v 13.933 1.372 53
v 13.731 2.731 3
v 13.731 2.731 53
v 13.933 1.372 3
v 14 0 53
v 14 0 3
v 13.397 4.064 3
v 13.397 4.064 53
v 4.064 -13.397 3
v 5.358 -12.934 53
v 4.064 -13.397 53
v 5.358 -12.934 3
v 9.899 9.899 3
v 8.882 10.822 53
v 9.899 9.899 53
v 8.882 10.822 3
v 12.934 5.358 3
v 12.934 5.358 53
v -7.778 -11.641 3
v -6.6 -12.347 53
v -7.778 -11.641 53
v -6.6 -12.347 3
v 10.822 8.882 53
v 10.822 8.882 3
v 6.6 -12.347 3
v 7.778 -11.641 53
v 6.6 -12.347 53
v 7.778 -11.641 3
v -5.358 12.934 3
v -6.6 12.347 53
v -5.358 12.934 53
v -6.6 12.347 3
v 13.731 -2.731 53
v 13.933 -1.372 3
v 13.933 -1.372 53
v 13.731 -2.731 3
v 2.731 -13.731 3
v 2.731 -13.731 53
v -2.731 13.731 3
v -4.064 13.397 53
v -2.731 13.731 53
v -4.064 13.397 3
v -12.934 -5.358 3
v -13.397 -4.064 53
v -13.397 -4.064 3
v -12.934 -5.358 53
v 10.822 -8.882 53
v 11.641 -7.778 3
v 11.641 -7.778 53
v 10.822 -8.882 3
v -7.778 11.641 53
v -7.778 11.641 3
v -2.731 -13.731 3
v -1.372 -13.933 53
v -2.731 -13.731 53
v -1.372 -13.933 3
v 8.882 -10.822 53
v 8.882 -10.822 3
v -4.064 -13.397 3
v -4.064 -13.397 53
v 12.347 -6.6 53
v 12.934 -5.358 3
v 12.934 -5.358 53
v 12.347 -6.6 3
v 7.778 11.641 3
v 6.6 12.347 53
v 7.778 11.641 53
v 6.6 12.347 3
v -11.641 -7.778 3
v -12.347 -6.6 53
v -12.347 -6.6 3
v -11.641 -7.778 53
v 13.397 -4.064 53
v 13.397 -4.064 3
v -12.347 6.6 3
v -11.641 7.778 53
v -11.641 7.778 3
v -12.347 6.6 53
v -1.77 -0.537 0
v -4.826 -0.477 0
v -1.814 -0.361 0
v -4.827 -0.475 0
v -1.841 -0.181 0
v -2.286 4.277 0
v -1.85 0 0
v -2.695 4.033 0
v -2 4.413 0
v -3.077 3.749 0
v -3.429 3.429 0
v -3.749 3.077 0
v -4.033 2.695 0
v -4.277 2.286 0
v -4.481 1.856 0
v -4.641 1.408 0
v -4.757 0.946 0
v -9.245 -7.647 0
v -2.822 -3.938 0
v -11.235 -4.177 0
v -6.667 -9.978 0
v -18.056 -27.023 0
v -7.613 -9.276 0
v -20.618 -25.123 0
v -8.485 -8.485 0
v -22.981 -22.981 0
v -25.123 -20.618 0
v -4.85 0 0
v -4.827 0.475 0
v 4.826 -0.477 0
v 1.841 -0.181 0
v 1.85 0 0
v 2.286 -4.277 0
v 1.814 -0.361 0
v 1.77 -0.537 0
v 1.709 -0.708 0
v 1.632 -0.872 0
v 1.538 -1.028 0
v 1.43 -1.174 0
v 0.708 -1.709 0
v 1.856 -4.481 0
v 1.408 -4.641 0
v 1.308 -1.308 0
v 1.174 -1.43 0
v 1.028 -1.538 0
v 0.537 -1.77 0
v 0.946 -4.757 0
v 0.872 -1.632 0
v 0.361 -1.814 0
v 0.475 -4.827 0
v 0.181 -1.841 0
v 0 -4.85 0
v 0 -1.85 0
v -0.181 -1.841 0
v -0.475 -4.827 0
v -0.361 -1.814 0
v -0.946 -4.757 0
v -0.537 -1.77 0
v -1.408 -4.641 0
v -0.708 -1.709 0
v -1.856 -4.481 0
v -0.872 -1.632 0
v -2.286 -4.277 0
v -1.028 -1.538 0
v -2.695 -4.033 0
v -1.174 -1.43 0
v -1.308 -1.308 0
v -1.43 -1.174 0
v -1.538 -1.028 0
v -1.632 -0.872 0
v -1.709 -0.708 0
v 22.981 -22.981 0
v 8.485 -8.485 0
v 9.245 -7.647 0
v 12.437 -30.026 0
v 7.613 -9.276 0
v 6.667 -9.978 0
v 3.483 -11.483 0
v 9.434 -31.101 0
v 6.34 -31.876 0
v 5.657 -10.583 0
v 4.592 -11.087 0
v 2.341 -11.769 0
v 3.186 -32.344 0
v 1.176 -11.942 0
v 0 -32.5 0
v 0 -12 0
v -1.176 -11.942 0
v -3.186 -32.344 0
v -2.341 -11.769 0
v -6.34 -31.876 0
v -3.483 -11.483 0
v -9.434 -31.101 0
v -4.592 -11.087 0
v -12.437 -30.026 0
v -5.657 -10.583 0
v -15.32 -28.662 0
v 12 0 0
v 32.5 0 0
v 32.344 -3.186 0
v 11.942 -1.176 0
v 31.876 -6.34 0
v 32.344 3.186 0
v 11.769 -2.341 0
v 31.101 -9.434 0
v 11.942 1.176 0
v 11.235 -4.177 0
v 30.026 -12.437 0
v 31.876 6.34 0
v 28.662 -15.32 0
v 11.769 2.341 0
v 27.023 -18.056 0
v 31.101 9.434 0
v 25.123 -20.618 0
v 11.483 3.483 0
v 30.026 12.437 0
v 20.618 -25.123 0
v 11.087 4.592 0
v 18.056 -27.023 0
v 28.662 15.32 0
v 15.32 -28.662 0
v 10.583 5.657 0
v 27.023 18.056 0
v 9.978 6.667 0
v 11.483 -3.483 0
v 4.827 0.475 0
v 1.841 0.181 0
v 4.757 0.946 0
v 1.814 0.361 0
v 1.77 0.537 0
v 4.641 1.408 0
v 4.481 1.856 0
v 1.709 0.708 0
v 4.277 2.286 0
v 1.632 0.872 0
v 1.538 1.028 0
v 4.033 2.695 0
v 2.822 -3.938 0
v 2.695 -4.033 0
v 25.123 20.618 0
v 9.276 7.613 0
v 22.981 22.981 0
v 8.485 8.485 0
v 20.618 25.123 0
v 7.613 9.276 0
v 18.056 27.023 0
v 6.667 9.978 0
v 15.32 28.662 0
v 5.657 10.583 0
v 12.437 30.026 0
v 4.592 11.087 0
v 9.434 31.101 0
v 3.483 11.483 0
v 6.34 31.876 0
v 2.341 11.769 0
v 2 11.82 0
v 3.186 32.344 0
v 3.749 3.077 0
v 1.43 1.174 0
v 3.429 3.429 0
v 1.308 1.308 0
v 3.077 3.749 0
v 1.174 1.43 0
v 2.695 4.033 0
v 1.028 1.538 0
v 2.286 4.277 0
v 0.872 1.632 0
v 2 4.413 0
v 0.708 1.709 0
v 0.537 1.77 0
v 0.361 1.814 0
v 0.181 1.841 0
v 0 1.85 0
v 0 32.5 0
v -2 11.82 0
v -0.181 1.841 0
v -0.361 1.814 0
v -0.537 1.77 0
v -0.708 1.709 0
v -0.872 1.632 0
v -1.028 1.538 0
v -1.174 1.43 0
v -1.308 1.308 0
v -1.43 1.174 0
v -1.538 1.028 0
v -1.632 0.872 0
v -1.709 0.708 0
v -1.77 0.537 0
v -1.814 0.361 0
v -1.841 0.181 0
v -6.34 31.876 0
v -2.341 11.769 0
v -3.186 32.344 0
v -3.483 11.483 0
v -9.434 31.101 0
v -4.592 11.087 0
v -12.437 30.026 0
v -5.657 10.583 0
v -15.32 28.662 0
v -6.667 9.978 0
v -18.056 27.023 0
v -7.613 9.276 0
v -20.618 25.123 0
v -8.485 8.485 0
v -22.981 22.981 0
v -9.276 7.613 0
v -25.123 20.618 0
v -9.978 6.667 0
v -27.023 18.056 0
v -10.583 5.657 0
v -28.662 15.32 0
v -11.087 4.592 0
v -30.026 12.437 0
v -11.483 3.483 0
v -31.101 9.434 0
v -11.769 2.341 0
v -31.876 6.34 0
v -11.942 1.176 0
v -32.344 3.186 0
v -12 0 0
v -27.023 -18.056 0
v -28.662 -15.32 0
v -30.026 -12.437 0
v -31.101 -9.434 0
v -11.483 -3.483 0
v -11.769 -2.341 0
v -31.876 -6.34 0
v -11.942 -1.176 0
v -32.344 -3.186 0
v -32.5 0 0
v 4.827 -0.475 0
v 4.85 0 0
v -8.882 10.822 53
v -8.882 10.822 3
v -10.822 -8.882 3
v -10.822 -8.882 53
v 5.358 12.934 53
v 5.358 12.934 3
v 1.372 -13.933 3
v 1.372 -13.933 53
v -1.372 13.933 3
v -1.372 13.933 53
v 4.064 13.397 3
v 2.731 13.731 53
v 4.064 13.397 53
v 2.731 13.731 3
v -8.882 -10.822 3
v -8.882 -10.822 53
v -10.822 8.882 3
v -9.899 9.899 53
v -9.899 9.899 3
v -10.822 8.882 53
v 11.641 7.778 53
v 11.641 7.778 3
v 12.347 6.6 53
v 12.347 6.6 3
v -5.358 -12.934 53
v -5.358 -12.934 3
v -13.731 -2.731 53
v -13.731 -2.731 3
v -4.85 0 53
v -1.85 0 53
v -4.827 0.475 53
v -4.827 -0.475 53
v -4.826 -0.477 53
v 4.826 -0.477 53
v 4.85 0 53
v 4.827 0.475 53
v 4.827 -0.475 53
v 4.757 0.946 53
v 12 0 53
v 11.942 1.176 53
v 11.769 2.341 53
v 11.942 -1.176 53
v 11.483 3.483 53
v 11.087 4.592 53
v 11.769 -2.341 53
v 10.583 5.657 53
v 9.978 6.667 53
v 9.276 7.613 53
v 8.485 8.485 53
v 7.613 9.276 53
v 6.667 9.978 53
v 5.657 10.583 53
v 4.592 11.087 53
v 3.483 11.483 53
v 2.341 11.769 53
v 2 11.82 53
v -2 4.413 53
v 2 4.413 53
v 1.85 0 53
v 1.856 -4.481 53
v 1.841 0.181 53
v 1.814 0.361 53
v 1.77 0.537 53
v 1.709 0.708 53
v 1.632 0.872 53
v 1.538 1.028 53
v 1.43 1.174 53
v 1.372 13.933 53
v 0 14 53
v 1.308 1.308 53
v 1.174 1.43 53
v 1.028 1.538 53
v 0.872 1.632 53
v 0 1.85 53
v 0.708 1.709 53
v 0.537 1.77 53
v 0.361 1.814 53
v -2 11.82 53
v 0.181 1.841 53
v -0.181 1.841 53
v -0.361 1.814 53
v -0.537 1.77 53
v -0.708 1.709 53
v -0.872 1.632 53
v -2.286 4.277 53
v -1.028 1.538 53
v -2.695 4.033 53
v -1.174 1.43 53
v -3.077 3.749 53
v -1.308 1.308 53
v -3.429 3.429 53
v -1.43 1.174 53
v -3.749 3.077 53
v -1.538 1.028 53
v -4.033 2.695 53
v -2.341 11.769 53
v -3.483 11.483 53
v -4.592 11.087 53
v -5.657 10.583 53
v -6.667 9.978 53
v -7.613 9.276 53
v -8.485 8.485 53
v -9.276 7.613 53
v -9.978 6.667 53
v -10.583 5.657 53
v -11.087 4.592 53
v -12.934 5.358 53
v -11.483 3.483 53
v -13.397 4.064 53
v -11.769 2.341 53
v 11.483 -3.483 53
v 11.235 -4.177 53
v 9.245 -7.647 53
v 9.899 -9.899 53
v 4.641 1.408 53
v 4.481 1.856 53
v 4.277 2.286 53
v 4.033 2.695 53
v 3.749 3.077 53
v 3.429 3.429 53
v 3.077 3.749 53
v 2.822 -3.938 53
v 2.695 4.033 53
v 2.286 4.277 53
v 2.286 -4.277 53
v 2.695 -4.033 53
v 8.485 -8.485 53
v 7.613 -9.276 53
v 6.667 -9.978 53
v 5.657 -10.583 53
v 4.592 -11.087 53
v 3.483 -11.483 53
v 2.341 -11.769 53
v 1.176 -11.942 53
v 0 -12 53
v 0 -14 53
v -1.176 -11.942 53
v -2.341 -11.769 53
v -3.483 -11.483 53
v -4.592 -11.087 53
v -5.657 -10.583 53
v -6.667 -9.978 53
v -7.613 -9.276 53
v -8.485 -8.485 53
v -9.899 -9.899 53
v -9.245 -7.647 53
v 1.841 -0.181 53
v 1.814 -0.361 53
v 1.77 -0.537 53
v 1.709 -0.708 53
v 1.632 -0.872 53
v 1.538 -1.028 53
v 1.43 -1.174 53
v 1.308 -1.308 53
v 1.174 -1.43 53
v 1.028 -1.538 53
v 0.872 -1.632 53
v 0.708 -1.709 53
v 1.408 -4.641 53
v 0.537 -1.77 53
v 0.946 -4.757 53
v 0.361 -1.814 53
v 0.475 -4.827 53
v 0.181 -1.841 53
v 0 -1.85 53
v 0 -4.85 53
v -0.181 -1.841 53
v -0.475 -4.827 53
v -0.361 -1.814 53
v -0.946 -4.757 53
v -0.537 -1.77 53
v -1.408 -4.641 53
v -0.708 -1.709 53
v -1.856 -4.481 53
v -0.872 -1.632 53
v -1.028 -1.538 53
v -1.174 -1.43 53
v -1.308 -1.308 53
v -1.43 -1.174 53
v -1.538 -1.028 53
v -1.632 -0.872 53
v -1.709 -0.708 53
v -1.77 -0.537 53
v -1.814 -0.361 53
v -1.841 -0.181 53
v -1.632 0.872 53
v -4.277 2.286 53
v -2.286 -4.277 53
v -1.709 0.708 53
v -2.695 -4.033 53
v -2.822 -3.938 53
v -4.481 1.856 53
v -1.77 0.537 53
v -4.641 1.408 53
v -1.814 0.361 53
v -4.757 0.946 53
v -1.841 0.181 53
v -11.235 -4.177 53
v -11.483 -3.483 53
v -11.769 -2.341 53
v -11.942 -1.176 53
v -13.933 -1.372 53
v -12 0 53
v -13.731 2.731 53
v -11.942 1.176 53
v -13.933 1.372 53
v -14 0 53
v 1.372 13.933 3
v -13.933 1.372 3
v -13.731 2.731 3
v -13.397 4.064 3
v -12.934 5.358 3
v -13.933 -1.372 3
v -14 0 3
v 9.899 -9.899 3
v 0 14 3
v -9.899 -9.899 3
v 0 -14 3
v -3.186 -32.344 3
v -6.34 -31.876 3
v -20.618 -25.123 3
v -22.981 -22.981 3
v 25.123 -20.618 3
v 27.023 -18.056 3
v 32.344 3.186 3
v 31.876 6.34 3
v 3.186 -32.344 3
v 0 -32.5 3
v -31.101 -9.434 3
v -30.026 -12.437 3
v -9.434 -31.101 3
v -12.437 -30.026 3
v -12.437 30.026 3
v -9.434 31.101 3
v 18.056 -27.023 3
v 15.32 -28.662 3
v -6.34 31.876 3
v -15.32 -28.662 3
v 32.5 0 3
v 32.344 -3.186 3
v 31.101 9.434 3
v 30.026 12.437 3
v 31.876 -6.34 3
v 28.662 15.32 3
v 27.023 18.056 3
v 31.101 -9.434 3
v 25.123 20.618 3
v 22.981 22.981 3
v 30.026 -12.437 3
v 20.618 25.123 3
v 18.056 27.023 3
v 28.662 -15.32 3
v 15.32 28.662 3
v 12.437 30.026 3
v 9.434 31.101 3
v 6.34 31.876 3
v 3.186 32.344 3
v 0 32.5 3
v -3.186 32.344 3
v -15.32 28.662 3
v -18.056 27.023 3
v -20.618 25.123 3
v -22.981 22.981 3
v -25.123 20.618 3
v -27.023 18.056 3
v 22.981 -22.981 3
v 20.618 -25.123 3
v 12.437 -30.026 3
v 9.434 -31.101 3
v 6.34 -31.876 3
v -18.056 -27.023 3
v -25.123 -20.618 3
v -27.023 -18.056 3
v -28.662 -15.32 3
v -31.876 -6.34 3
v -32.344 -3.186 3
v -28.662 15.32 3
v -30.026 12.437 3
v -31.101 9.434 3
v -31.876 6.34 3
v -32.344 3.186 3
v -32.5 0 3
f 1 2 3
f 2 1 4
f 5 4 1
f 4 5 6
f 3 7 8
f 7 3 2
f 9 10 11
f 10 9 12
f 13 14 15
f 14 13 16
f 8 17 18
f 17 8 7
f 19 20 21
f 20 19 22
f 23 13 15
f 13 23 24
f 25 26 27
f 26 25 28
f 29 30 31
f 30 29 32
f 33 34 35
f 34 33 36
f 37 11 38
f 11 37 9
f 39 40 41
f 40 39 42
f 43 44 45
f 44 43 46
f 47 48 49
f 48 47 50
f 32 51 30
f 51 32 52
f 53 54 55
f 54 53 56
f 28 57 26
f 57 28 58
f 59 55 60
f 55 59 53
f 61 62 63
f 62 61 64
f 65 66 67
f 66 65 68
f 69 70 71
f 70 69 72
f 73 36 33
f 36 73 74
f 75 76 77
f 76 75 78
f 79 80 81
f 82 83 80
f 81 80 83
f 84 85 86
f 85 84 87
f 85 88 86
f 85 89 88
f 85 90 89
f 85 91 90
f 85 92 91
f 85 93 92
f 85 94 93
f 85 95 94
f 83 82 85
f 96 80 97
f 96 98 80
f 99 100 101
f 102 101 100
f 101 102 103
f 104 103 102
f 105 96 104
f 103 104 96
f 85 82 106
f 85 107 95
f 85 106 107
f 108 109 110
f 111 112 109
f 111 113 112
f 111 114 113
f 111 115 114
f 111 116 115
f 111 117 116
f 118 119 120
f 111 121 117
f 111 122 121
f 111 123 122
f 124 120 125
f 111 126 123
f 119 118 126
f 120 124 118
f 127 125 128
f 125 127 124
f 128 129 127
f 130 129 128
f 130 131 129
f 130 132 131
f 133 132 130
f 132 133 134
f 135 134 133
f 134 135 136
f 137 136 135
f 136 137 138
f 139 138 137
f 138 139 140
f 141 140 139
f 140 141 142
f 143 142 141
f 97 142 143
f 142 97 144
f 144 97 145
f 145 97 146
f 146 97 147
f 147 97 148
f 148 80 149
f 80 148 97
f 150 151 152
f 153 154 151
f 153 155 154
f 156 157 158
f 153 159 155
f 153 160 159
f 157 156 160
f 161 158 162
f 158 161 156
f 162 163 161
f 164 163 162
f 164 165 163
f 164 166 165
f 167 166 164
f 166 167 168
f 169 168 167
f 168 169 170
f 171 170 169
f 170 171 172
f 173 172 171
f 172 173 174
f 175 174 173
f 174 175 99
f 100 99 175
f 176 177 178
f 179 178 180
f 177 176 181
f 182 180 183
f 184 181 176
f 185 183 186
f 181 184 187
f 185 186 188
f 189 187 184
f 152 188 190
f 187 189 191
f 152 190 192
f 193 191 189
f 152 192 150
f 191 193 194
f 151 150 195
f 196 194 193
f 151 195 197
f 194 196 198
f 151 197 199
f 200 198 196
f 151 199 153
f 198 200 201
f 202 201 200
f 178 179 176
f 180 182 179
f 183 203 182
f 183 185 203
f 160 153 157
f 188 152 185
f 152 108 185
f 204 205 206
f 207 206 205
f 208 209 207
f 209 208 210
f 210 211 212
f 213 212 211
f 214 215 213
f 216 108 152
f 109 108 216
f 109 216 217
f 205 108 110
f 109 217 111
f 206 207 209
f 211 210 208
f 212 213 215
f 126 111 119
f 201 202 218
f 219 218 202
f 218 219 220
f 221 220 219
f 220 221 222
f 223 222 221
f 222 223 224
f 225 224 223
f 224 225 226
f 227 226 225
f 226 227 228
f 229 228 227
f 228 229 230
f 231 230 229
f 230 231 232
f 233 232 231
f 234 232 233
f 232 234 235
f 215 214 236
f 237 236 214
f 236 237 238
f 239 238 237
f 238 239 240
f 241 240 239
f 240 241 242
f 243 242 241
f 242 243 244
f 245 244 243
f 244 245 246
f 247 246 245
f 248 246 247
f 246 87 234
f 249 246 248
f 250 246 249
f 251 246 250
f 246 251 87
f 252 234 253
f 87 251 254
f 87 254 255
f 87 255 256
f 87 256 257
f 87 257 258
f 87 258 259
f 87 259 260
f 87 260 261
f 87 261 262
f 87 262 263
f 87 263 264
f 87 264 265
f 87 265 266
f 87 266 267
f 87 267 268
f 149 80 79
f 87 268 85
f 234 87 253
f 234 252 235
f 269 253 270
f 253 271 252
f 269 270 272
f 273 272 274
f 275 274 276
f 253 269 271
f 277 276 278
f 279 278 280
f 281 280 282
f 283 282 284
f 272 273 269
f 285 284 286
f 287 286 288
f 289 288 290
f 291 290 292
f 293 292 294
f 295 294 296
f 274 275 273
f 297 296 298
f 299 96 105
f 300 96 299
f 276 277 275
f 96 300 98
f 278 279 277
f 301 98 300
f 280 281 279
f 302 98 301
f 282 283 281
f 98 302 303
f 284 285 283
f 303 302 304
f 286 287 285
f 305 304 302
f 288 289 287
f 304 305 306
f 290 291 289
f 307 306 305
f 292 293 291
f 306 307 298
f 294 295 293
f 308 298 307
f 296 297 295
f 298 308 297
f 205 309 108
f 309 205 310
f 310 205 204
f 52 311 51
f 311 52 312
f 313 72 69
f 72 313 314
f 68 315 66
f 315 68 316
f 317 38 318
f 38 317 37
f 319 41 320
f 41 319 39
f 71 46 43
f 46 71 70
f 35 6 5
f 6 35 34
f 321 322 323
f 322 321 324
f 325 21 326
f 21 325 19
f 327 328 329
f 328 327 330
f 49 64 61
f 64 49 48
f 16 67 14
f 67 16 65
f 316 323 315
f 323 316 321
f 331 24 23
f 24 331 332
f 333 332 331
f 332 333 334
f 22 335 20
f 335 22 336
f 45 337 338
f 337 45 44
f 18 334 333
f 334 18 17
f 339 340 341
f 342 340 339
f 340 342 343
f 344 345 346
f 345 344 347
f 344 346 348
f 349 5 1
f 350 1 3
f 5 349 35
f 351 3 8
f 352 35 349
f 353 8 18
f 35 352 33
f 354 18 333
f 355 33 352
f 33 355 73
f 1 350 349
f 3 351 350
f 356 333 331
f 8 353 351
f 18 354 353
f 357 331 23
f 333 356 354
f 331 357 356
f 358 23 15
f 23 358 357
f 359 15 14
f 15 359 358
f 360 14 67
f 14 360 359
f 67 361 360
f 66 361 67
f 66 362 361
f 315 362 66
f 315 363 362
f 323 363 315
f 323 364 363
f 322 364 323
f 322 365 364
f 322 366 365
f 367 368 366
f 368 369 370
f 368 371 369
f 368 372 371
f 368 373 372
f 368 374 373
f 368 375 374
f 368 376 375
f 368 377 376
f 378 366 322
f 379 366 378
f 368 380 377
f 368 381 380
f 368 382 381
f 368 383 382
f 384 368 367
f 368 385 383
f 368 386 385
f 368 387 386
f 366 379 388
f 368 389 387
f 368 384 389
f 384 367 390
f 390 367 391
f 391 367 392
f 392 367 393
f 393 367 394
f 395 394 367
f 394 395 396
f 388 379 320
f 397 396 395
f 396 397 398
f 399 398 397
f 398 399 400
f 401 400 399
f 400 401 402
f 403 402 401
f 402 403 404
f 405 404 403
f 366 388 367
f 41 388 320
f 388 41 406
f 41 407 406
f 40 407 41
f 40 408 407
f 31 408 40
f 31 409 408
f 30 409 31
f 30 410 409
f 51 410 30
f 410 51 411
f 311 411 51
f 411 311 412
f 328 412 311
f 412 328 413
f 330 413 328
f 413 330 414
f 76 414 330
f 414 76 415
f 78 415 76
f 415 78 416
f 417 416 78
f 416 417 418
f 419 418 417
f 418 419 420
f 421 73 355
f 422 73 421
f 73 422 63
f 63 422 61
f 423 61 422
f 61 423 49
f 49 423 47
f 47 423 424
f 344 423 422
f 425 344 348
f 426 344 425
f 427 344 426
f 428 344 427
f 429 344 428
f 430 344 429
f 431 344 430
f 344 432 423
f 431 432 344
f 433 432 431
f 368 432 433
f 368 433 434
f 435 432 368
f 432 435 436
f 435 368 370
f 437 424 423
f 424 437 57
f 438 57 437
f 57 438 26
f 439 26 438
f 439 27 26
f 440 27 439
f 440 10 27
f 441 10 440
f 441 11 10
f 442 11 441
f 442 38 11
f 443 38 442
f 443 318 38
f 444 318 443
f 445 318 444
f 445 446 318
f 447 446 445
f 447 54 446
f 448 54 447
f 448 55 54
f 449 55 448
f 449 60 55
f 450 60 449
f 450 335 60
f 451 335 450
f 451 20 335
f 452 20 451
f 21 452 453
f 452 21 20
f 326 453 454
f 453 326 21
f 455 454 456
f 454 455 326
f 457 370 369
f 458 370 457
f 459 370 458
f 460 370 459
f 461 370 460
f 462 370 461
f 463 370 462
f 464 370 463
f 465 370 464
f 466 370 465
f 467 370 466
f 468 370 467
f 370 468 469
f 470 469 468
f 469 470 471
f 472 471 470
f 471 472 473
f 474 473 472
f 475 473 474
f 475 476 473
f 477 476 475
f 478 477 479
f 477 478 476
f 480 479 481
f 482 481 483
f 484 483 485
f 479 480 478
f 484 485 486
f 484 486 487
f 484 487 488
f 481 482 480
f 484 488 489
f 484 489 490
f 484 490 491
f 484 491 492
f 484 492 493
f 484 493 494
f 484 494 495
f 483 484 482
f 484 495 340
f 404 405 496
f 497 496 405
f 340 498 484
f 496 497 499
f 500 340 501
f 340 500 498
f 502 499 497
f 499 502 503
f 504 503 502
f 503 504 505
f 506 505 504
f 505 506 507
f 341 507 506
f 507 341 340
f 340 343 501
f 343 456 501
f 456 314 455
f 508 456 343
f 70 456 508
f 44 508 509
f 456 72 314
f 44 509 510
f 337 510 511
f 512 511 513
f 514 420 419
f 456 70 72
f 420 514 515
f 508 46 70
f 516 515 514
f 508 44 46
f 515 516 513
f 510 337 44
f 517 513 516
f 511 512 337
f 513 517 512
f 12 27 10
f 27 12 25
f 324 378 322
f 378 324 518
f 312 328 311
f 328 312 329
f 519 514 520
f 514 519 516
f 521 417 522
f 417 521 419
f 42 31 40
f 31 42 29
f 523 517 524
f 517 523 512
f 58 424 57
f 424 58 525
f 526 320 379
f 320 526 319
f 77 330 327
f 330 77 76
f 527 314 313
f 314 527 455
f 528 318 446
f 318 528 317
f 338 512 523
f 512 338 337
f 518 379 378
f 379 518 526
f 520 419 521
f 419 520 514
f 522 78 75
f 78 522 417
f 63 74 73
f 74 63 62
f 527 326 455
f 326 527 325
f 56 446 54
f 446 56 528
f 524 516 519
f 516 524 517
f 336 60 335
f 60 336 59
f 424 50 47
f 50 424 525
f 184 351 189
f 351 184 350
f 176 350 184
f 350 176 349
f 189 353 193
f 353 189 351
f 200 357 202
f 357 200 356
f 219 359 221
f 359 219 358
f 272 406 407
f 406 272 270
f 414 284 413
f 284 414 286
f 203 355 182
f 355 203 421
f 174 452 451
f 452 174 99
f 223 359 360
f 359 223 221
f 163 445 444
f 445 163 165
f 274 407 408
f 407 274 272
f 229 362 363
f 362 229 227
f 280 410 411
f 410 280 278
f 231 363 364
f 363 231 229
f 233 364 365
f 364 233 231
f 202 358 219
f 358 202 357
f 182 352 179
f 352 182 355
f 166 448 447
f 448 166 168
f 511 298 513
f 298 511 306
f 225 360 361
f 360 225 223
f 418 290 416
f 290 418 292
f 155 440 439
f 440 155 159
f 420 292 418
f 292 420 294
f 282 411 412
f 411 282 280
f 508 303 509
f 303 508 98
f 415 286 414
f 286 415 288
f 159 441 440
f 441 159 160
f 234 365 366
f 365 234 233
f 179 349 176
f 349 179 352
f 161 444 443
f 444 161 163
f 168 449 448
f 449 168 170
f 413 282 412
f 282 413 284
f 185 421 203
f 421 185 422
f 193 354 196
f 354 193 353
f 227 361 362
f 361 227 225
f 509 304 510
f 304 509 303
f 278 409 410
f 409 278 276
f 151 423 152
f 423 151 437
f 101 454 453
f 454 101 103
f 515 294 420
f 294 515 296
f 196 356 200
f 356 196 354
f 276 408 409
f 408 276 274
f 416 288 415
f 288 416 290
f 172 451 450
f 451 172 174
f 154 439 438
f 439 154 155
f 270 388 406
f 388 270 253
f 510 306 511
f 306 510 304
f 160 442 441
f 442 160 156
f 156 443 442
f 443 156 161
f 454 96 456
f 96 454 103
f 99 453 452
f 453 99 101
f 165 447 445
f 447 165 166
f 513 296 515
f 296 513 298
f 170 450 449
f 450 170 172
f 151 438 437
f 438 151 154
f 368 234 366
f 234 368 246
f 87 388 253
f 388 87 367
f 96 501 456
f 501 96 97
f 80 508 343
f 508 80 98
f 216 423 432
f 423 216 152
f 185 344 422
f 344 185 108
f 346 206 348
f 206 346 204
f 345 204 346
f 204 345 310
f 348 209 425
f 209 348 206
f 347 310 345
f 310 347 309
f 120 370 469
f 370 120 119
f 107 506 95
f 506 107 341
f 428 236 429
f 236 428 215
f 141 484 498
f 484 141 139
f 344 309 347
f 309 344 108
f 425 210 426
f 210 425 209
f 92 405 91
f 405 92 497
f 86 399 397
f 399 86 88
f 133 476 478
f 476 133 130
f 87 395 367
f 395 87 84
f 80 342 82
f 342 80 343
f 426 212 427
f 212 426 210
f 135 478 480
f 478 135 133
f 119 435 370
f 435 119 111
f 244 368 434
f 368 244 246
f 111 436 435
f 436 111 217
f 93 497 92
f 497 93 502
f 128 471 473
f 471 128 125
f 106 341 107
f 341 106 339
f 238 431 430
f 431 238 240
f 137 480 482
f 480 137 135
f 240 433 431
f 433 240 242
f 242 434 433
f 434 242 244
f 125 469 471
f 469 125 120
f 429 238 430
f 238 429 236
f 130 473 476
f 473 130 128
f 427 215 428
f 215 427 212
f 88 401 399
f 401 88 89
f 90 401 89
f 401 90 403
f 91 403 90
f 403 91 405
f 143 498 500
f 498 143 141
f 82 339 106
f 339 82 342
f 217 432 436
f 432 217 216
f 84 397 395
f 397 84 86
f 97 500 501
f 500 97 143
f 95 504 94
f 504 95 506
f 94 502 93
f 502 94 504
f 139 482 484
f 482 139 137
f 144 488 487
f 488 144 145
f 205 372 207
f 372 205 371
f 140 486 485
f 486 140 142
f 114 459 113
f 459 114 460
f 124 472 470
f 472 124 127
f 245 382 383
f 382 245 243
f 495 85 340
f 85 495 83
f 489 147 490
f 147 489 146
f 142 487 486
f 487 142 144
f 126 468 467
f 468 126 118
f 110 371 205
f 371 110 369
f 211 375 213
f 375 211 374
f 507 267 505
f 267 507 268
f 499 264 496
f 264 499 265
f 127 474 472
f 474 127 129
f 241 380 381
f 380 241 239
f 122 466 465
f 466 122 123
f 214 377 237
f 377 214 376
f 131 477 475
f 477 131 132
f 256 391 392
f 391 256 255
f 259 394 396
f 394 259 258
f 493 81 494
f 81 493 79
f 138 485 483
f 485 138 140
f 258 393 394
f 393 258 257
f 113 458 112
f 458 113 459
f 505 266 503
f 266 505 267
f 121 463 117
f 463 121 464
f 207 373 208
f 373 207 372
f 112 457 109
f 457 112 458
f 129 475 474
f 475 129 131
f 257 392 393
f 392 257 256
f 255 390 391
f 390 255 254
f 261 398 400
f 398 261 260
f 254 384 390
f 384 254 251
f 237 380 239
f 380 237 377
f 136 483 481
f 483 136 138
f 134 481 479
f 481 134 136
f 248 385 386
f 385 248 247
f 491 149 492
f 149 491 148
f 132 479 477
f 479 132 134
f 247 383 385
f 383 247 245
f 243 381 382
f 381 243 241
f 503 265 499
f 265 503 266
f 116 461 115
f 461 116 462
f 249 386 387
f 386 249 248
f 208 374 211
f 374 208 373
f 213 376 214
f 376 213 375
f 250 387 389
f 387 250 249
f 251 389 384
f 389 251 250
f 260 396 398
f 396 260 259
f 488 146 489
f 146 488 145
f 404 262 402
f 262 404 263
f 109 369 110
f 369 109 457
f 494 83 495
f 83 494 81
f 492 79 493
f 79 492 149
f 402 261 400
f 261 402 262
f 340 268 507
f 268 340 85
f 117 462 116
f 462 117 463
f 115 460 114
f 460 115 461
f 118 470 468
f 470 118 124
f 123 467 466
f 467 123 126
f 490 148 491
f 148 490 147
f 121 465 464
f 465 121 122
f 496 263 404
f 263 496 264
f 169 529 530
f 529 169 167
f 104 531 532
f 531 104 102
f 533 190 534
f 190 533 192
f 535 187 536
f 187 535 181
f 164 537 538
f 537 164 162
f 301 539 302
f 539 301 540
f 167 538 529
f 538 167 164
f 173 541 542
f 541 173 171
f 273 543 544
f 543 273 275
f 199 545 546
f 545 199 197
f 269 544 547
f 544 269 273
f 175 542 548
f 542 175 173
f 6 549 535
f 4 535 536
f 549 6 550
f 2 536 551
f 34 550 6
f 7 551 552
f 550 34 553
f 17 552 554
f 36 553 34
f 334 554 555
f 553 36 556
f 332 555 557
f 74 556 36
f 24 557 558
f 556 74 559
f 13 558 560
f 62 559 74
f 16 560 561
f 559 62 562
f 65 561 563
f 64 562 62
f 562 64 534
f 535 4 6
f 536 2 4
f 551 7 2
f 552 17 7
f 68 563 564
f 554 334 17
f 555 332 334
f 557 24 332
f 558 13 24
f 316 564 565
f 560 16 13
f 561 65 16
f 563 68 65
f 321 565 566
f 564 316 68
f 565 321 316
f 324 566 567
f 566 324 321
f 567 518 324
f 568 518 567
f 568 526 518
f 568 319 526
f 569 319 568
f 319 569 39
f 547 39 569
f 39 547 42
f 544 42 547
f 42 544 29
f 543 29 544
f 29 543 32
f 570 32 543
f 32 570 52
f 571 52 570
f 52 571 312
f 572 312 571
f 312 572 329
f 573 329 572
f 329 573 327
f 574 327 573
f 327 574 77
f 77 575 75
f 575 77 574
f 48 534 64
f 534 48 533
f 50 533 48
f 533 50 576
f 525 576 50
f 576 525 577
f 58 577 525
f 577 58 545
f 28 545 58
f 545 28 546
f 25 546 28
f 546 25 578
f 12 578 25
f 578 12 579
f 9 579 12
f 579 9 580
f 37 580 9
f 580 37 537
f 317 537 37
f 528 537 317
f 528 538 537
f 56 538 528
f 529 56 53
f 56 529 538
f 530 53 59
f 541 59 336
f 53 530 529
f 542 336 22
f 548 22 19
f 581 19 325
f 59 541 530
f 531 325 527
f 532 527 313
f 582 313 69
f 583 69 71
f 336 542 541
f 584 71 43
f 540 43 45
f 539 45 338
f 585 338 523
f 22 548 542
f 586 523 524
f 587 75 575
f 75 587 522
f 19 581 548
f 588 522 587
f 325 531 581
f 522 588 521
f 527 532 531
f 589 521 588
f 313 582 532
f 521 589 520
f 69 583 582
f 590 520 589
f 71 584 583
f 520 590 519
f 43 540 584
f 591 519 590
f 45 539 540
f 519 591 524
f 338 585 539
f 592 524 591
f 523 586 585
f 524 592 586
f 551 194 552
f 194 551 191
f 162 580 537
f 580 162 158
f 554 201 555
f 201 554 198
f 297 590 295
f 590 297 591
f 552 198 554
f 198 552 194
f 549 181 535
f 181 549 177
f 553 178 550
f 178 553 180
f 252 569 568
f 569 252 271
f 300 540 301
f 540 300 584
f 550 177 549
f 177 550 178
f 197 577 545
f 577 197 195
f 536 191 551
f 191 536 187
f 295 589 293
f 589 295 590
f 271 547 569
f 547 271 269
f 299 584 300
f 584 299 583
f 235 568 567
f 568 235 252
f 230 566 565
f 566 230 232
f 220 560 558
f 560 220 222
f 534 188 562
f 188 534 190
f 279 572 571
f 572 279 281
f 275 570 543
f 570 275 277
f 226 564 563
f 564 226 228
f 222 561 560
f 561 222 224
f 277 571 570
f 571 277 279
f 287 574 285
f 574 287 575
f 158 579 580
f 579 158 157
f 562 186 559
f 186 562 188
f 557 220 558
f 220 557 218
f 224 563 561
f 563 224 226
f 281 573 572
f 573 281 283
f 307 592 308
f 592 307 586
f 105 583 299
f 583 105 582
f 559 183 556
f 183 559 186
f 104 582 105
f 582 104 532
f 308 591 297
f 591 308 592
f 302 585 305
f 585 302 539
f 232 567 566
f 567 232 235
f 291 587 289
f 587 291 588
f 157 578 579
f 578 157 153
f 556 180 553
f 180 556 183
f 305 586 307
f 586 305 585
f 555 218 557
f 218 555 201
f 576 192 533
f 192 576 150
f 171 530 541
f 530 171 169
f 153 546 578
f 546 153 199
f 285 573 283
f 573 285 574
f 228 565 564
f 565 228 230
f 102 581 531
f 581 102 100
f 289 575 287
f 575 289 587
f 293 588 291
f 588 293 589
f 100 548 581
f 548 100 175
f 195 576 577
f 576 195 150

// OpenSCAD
$fn=64+0;   // +0 so it's ignored by customizer

// Select part
part = "first"; // [first:Mount,second:Mount cap]
screw_hole_diameter = 3.7;
transformer_height = 50;
transformer_inner_diameter = 28;
mount_wall_thickness = 2;
pedestal_diameter = 65;
pedestal_height = 3;
number_of_spokes = 3; // [2:16]
cap_thickness = 3;
cap_diameter = 37;

if(part=="first") {
    toroid_transformer_holder(
        spokes=number_of_spokes,
        h=transformer_height,
        ow=mount_wall_thickness,
        od=transformer_inner_diameter,
        base_h=pedestal_height,
        base_d=pedestal_diameter,
        hole_d=screw_hole_diameter
    );
} else if (part=="second") {
    toroid_cap(
        cd=cap_diameter,
        ch=cap_thickness,
        hd=screw_hole_diameter
    );
}

module toroid_cap(cd=37,ch=3,hd=4) {
    difference() {
        cylinder(d = cd, h=ch);
        translate([0,0,-.5])
            cylinder(d = hd, h=ch+1);
    }
}

module toroid_transformer_holder(h = 37, od = 31, ow = 1.5, iw=3, hole_d=3, spokes=3, base_h=3, base_d=70 )
{
    spoke_deg = 360/spokes;
    difference() {
        union() {
            cylinder(d = hole_d+iw*2, h = h+base_h);
            difference() {
                cylinder(d = od, h = h+base_h);
                translate([0,0,-.5]) cylinder(d = od-ow*2, h = h+base_h+1);  // +1 to make it look nicer on preview
            }
            intersection() {
                for(a=[0:spokes-1])
                {
                    rotate([0,0,a*spoke_deg]) translate([0,od/4,(h+base_h)/2]) cube([ow*2,od/2,h+base_h], true);
                }
                cylinder(d = od, h = h+base_h);
            }
        }
        translate([0,0,-.5]) cylinder(d = hole_d, h = h+base_h+1);
    }
    difference() {
        cylinder(h = base_h, d = base_d);
        cylinder(h = base_h, d = od);
    }

}
